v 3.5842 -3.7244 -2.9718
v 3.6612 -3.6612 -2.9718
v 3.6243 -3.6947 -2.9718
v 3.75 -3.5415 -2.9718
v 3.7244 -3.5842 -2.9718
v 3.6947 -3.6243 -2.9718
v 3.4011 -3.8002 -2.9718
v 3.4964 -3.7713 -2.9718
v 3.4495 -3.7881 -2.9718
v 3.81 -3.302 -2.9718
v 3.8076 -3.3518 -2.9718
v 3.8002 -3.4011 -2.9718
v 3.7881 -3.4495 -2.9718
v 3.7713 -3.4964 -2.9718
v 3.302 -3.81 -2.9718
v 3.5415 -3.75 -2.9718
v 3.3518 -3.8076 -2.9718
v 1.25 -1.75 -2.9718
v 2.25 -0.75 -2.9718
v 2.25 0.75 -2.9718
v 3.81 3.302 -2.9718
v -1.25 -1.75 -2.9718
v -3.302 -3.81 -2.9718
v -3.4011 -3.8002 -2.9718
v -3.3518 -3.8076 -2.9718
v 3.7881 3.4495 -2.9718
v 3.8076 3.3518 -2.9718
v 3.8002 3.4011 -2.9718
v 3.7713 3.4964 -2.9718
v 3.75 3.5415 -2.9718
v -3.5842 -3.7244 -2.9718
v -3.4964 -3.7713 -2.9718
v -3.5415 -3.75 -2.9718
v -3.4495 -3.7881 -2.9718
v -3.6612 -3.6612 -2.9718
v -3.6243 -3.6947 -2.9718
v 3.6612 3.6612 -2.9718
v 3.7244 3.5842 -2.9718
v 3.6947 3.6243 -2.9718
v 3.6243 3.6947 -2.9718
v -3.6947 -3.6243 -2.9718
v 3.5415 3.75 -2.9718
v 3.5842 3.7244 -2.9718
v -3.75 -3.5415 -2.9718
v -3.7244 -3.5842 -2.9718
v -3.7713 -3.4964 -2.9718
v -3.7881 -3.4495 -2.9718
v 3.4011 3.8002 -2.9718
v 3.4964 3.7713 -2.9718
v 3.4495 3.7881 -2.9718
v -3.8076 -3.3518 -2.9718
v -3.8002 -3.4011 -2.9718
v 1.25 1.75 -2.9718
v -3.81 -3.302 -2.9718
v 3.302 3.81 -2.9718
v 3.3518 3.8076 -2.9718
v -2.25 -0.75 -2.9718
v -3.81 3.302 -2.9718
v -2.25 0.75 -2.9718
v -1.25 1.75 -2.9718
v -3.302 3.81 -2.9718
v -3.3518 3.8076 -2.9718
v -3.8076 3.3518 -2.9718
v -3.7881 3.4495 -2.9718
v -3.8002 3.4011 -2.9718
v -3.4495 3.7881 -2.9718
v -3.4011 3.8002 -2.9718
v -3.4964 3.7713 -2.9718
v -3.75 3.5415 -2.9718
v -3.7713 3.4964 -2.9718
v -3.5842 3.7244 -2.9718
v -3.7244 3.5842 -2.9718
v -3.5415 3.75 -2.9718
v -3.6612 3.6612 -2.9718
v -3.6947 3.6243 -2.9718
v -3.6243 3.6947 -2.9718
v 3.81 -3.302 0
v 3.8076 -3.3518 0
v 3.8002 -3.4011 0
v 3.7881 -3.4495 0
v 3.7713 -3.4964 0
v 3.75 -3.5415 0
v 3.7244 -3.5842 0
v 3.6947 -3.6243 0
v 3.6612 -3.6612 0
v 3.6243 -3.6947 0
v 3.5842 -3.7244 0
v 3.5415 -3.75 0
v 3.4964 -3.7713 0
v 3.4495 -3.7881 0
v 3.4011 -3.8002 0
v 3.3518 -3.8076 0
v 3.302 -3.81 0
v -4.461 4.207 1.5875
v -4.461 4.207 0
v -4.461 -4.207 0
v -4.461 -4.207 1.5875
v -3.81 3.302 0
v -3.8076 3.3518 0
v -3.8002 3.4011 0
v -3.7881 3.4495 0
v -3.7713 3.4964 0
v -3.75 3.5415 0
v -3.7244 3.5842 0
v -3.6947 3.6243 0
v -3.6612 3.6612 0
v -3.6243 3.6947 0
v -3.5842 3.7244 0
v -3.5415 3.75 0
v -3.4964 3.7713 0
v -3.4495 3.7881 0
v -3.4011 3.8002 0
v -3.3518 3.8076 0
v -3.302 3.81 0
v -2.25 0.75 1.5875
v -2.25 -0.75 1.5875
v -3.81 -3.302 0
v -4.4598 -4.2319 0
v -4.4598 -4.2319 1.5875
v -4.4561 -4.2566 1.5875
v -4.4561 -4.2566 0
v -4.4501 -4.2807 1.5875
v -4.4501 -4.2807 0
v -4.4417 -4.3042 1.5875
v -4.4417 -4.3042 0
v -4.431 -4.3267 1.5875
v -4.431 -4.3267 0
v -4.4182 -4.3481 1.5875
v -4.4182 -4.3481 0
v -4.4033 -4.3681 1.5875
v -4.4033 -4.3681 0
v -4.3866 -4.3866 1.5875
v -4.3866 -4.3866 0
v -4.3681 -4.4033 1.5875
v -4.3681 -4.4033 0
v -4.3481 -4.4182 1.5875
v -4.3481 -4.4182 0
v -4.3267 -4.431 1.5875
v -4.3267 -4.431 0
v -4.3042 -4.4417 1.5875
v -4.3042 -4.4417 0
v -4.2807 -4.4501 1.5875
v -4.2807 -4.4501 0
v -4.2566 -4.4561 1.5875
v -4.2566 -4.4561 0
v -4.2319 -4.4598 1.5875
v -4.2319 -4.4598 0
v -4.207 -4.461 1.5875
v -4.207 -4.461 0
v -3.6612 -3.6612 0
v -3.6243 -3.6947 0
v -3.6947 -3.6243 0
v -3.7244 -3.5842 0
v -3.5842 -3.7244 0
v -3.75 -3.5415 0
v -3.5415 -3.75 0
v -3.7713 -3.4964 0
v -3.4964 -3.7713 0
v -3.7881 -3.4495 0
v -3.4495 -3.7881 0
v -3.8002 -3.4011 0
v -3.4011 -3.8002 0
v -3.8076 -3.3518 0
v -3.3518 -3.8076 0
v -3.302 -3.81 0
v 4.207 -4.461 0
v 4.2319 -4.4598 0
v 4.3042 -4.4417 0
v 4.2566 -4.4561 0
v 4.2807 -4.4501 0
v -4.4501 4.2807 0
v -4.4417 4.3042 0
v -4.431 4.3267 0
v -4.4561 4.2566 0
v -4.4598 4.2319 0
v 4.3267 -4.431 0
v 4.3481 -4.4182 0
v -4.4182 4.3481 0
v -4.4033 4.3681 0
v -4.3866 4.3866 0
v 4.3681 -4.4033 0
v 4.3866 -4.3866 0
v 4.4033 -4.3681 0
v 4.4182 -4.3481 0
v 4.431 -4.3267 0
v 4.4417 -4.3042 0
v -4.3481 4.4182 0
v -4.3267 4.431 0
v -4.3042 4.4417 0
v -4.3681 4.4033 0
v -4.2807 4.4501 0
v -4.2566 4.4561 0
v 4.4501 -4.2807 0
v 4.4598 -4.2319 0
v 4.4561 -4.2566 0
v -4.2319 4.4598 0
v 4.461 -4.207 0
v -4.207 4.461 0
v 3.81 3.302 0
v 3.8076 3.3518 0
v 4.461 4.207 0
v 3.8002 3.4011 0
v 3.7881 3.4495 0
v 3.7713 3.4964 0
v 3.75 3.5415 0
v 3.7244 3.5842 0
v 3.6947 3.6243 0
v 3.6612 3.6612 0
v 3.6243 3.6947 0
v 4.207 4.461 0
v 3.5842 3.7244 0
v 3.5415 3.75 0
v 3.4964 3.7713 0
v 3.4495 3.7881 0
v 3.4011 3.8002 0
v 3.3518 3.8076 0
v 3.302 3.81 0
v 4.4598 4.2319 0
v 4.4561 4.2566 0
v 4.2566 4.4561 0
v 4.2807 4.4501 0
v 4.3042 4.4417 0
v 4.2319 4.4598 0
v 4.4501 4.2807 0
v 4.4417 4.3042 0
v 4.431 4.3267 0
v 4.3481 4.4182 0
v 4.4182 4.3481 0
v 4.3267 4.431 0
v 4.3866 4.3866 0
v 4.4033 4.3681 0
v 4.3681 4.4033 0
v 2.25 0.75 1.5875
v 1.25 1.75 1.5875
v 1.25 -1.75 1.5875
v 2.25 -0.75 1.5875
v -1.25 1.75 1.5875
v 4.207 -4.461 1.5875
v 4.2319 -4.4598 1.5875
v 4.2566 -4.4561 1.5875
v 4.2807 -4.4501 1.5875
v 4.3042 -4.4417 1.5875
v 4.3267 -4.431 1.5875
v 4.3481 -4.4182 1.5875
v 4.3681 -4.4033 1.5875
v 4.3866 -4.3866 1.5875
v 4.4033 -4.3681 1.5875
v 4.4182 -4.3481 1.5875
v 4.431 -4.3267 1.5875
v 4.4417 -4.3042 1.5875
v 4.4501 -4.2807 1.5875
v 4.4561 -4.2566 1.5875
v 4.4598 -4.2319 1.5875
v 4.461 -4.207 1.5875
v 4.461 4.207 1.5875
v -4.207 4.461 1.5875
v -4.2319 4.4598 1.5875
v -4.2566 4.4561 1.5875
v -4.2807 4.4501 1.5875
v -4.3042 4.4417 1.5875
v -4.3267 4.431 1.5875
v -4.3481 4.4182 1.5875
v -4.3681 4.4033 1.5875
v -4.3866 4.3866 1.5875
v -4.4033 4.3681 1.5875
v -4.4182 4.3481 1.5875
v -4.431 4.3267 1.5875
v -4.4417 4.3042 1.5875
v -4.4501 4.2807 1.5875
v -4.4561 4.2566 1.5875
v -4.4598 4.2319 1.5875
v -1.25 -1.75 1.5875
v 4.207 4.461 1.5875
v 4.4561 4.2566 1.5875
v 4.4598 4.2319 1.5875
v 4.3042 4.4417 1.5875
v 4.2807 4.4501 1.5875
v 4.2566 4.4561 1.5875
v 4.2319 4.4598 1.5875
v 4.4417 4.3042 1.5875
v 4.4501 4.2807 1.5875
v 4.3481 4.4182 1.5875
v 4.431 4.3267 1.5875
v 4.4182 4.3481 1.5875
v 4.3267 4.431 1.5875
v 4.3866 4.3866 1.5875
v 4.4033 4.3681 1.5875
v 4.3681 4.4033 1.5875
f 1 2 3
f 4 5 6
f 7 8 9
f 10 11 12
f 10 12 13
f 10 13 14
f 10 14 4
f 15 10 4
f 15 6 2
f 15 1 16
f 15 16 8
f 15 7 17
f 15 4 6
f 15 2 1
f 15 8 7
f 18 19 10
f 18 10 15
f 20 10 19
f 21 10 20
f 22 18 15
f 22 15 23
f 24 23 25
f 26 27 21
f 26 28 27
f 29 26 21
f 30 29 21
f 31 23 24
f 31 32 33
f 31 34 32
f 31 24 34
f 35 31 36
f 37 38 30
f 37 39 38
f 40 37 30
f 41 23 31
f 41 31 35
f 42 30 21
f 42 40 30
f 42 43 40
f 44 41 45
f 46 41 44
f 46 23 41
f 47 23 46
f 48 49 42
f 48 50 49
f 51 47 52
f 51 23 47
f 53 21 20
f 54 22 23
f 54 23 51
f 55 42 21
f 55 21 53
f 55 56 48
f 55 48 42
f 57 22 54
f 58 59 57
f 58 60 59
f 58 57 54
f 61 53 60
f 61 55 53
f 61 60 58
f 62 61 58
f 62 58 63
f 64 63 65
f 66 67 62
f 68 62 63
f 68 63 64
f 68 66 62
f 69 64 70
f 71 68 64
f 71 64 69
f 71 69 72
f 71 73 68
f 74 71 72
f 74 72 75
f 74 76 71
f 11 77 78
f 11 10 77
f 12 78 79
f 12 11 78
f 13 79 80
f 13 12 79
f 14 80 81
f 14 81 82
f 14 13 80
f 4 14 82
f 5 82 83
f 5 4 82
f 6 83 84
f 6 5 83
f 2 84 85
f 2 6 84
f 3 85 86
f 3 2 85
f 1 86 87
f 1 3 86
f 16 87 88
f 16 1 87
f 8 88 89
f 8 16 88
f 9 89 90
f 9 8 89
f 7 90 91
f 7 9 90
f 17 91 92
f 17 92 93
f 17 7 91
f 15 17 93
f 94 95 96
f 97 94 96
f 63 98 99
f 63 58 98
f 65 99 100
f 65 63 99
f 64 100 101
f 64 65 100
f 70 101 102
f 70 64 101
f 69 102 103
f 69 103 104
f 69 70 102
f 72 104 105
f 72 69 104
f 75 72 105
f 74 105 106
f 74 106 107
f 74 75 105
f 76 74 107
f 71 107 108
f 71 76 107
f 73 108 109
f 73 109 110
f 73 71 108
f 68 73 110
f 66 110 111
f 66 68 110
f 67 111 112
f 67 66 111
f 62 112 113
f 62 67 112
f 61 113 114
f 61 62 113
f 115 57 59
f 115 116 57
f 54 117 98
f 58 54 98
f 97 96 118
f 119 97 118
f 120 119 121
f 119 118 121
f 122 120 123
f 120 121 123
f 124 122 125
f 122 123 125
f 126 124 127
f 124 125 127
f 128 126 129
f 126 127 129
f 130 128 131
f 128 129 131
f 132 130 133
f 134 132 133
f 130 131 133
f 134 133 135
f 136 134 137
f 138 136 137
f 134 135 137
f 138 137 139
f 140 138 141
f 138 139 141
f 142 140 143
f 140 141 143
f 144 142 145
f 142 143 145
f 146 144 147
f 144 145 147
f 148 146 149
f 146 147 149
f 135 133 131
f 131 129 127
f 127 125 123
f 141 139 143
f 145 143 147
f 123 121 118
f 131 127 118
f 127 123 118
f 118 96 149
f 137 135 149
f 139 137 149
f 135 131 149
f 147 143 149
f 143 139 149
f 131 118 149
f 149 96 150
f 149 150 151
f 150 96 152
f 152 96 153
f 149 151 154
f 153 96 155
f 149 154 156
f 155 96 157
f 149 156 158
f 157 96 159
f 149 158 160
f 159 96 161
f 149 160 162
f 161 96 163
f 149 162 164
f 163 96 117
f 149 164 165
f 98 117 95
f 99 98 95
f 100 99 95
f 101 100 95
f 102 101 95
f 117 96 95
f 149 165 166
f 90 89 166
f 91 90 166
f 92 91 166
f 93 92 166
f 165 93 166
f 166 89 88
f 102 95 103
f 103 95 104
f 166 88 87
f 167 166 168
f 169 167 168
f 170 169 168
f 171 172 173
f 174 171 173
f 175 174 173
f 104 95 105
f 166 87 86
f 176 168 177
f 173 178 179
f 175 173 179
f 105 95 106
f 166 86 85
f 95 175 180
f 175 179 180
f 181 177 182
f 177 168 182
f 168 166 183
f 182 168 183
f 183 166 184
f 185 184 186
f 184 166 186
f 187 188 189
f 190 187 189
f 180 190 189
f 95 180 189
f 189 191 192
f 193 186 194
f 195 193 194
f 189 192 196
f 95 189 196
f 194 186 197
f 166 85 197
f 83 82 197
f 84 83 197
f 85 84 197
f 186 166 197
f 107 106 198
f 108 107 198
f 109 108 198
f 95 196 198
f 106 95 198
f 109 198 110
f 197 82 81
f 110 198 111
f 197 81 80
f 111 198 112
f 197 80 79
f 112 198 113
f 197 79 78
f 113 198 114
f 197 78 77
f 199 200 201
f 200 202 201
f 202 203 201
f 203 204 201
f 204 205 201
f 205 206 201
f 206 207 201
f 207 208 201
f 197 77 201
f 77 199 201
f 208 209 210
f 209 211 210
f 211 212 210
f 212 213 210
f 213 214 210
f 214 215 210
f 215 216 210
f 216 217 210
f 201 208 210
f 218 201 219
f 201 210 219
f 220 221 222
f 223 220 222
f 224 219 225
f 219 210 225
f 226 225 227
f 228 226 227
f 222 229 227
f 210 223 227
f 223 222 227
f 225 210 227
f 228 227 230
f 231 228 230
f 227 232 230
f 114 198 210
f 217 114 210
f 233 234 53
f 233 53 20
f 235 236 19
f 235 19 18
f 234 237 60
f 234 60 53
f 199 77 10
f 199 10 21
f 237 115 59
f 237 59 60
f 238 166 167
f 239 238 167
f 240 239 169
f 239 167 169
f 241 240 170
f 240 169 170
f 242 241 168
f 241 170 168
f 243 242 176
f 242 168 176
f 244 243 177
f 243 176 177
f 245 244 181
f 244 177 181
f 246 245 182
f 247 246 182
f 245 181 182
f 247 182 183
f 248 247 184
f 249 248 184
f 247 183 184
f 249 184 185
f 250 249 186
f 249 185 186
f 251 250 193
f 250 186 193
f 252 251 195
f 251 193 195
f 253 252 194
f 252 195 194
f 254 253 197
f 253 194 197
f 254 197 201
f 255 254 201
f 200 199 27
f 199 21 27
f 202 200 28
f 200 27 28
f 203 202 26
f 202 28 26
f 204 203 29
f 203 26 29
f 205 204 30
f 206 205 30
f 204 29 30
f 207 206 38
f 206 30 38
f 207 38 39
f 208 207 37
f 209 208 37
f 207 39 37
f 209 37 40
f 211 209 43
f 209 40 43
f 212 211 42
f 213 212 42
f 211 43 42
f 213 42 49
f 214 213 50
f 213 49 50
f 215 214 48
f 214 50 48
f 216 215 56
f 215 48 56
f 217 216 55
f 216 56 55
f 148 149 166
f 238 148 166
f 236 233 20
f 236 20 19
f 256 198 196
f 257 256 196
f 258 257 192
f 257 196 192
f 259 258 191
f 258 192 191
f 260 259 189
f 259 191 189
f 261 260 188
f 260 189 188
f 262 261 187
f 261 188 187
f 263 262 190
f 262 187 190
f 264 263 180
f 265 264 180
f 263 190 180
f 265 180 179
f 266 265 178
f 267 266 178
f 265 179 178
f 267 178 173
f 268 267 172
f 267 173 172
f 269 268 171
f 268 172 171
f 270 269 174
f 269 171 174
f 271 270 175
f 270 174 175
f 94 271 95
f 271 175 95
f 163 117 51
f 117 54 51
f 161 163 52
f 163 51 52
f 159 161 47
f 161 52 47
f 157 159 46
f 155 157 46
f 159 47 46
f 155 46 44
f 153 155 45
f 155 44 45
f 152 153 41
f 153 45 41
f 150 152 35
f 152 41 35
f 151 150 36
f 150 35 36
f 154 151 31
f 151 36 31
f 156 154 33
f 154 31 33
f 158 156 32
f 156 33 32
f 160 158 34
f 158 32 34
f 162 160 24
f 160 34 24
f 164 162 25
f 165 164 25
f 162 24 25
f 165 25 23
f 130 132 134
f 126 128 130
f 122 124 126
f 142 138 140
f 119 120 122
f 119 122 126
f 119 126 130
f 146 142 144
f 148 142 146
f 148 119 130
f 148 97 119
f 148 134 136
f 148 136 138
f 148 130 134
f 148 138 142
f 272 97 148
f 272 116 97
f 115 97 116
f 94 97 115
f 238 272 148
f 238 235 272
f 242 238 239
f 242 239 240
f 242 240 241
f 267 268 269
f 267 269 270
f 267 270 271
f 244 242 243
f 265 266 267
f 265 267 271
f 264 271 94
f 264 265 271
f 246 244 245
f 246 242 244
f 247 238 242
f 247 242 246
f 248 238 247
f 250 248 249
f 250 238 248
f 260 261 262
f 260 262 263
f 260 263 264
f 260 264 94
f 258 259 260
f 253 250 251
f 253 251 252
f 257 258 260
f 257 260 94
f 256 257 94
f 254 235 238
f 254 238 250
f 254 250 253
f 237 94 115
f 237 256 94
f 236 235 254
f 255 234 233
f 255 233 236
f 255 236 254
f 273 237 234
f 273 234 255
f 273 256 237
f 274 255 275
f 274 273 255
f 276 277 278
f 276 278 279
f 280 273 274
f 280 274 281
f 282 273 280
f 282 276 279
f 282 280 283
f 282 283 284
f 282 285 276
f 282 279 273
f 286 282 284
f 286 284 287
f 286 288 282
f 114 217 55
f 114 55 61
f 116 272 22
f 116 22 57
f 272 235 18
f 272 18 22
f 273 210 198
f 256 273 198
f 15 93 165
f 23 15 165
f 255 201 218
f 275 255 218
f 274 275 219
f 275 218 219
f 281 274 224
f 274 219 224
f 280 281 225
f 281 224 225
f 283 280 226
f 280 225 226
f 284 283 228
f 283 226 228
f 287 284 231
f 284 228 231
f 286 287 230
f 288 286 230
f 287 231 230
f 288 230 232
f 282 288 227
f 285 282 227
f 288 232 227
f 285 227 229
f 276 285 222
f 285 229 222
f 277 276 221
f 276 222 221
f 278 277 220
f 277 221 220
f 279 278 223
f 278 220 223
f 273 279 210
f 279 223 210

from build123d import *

# Parameters (mm, degrees)
BOSS_EXTRUDE1_DEPTH = 1.5875
SKETCH2_W           = 4.5
SKETCH2_H           = 3.5
CUT_EXTRUDE1_DEPTH  = 2.5875
CHAMFER1_SIZE       = 1
SKETCH3_W           = 7.62
SKETCH3_H           = 7.62
BOSS_EXTRUDE2_DEPTH = 2.9718
FILLET1_R           = 0.508


with BuildPart() as part:
    # Sketch1 → Boss-Extrude1 (new body)
    with BuildSketch(Plane.XY):
        with BuildLine():
            Line((4.207, 4.461), (-4.207, 4.461))
            ThreePointArc((-4.207, 4.461), (-4.386605122, 4.386605122), (-4.461, 4.207))
            Line((-4.461, 4.207), (-4.461, -4.207))
            ThreePointArc((-4.461, -4.207), (-4.386605122, -4.386605122), (-4.207, -4.461))
            Line((-4.207, -4.461), (4.207, -4.461))
            ThreePointArc((4.207, -4.461), (4.386605122, -4.386605122), (4.461, -4.207))
            Line((4.461, -4.207), (4.461, 4.207))
            ThreePointArc((4.461, 4.207), (4.386605122, 4.386605122), (4.207, 4.461))
        make_face()
    extrude(amount=BOSS_EXTRUDE1_DEPTH)

    # Sketch2 → Cut-Extrude1 (cut, through all)
    with BuildSketch(Plane.XY.offset(1.5875)):
        Rectangle(SKETCH2_W, SKETCH2_H)
    extrude(amount=-CUT_EXTRUDE1_DEPTH, mode=Mode.SUBTRACT)

    # Chamfer1
    chamfer1_edges = [part.edges().sort_by_distance(p)[0] for p in [
        (2.25, 1.75, 0.79375),
        (2.25, -1.75, 0.79375),
        (-2.25, -1.75, 0.79375),
        (-2.25, 1.75, 0.79375),
    ]]
    chamfer(chamfer1_edges, length=CHAMFER1_SIZE)

    # Sketch3 → Boss-Extrude2 (add)
    with BuildSketch(Plane(origin=(0, 0, 0), x_dir=(-1, 0, 0), z_dir=(0, 0, -1))):
        Rectangle(SKETCH3_W, SKETCH3_H)
        Polygon((2.25, -0.75), (2.25, 0.75), (1.25, 1.75), (-1.25, 1.75), (-2.25, 0.75), (-2.25, -0.75), (-1.25, -1.75), (1.25, -1.75), align=None, mode=Mode.SUBTRACT)
    extrude(amount=BOSS_EXTRUDE2_DEPTH)

    # Fillet1
    fillet1_edges = [part.edges().sort_by_distance(p)[0] for p in [
        (3.81, 3.81, -1.4859),
        (3.81, -3.81, -1.4859),
        (-3.81, -3.81, -1.4859),
        (-3.81, 3.81, -1.4859),
    ]]
    fillet(fillet1_edges, radius=FILLET1_R)


solid = part.part
